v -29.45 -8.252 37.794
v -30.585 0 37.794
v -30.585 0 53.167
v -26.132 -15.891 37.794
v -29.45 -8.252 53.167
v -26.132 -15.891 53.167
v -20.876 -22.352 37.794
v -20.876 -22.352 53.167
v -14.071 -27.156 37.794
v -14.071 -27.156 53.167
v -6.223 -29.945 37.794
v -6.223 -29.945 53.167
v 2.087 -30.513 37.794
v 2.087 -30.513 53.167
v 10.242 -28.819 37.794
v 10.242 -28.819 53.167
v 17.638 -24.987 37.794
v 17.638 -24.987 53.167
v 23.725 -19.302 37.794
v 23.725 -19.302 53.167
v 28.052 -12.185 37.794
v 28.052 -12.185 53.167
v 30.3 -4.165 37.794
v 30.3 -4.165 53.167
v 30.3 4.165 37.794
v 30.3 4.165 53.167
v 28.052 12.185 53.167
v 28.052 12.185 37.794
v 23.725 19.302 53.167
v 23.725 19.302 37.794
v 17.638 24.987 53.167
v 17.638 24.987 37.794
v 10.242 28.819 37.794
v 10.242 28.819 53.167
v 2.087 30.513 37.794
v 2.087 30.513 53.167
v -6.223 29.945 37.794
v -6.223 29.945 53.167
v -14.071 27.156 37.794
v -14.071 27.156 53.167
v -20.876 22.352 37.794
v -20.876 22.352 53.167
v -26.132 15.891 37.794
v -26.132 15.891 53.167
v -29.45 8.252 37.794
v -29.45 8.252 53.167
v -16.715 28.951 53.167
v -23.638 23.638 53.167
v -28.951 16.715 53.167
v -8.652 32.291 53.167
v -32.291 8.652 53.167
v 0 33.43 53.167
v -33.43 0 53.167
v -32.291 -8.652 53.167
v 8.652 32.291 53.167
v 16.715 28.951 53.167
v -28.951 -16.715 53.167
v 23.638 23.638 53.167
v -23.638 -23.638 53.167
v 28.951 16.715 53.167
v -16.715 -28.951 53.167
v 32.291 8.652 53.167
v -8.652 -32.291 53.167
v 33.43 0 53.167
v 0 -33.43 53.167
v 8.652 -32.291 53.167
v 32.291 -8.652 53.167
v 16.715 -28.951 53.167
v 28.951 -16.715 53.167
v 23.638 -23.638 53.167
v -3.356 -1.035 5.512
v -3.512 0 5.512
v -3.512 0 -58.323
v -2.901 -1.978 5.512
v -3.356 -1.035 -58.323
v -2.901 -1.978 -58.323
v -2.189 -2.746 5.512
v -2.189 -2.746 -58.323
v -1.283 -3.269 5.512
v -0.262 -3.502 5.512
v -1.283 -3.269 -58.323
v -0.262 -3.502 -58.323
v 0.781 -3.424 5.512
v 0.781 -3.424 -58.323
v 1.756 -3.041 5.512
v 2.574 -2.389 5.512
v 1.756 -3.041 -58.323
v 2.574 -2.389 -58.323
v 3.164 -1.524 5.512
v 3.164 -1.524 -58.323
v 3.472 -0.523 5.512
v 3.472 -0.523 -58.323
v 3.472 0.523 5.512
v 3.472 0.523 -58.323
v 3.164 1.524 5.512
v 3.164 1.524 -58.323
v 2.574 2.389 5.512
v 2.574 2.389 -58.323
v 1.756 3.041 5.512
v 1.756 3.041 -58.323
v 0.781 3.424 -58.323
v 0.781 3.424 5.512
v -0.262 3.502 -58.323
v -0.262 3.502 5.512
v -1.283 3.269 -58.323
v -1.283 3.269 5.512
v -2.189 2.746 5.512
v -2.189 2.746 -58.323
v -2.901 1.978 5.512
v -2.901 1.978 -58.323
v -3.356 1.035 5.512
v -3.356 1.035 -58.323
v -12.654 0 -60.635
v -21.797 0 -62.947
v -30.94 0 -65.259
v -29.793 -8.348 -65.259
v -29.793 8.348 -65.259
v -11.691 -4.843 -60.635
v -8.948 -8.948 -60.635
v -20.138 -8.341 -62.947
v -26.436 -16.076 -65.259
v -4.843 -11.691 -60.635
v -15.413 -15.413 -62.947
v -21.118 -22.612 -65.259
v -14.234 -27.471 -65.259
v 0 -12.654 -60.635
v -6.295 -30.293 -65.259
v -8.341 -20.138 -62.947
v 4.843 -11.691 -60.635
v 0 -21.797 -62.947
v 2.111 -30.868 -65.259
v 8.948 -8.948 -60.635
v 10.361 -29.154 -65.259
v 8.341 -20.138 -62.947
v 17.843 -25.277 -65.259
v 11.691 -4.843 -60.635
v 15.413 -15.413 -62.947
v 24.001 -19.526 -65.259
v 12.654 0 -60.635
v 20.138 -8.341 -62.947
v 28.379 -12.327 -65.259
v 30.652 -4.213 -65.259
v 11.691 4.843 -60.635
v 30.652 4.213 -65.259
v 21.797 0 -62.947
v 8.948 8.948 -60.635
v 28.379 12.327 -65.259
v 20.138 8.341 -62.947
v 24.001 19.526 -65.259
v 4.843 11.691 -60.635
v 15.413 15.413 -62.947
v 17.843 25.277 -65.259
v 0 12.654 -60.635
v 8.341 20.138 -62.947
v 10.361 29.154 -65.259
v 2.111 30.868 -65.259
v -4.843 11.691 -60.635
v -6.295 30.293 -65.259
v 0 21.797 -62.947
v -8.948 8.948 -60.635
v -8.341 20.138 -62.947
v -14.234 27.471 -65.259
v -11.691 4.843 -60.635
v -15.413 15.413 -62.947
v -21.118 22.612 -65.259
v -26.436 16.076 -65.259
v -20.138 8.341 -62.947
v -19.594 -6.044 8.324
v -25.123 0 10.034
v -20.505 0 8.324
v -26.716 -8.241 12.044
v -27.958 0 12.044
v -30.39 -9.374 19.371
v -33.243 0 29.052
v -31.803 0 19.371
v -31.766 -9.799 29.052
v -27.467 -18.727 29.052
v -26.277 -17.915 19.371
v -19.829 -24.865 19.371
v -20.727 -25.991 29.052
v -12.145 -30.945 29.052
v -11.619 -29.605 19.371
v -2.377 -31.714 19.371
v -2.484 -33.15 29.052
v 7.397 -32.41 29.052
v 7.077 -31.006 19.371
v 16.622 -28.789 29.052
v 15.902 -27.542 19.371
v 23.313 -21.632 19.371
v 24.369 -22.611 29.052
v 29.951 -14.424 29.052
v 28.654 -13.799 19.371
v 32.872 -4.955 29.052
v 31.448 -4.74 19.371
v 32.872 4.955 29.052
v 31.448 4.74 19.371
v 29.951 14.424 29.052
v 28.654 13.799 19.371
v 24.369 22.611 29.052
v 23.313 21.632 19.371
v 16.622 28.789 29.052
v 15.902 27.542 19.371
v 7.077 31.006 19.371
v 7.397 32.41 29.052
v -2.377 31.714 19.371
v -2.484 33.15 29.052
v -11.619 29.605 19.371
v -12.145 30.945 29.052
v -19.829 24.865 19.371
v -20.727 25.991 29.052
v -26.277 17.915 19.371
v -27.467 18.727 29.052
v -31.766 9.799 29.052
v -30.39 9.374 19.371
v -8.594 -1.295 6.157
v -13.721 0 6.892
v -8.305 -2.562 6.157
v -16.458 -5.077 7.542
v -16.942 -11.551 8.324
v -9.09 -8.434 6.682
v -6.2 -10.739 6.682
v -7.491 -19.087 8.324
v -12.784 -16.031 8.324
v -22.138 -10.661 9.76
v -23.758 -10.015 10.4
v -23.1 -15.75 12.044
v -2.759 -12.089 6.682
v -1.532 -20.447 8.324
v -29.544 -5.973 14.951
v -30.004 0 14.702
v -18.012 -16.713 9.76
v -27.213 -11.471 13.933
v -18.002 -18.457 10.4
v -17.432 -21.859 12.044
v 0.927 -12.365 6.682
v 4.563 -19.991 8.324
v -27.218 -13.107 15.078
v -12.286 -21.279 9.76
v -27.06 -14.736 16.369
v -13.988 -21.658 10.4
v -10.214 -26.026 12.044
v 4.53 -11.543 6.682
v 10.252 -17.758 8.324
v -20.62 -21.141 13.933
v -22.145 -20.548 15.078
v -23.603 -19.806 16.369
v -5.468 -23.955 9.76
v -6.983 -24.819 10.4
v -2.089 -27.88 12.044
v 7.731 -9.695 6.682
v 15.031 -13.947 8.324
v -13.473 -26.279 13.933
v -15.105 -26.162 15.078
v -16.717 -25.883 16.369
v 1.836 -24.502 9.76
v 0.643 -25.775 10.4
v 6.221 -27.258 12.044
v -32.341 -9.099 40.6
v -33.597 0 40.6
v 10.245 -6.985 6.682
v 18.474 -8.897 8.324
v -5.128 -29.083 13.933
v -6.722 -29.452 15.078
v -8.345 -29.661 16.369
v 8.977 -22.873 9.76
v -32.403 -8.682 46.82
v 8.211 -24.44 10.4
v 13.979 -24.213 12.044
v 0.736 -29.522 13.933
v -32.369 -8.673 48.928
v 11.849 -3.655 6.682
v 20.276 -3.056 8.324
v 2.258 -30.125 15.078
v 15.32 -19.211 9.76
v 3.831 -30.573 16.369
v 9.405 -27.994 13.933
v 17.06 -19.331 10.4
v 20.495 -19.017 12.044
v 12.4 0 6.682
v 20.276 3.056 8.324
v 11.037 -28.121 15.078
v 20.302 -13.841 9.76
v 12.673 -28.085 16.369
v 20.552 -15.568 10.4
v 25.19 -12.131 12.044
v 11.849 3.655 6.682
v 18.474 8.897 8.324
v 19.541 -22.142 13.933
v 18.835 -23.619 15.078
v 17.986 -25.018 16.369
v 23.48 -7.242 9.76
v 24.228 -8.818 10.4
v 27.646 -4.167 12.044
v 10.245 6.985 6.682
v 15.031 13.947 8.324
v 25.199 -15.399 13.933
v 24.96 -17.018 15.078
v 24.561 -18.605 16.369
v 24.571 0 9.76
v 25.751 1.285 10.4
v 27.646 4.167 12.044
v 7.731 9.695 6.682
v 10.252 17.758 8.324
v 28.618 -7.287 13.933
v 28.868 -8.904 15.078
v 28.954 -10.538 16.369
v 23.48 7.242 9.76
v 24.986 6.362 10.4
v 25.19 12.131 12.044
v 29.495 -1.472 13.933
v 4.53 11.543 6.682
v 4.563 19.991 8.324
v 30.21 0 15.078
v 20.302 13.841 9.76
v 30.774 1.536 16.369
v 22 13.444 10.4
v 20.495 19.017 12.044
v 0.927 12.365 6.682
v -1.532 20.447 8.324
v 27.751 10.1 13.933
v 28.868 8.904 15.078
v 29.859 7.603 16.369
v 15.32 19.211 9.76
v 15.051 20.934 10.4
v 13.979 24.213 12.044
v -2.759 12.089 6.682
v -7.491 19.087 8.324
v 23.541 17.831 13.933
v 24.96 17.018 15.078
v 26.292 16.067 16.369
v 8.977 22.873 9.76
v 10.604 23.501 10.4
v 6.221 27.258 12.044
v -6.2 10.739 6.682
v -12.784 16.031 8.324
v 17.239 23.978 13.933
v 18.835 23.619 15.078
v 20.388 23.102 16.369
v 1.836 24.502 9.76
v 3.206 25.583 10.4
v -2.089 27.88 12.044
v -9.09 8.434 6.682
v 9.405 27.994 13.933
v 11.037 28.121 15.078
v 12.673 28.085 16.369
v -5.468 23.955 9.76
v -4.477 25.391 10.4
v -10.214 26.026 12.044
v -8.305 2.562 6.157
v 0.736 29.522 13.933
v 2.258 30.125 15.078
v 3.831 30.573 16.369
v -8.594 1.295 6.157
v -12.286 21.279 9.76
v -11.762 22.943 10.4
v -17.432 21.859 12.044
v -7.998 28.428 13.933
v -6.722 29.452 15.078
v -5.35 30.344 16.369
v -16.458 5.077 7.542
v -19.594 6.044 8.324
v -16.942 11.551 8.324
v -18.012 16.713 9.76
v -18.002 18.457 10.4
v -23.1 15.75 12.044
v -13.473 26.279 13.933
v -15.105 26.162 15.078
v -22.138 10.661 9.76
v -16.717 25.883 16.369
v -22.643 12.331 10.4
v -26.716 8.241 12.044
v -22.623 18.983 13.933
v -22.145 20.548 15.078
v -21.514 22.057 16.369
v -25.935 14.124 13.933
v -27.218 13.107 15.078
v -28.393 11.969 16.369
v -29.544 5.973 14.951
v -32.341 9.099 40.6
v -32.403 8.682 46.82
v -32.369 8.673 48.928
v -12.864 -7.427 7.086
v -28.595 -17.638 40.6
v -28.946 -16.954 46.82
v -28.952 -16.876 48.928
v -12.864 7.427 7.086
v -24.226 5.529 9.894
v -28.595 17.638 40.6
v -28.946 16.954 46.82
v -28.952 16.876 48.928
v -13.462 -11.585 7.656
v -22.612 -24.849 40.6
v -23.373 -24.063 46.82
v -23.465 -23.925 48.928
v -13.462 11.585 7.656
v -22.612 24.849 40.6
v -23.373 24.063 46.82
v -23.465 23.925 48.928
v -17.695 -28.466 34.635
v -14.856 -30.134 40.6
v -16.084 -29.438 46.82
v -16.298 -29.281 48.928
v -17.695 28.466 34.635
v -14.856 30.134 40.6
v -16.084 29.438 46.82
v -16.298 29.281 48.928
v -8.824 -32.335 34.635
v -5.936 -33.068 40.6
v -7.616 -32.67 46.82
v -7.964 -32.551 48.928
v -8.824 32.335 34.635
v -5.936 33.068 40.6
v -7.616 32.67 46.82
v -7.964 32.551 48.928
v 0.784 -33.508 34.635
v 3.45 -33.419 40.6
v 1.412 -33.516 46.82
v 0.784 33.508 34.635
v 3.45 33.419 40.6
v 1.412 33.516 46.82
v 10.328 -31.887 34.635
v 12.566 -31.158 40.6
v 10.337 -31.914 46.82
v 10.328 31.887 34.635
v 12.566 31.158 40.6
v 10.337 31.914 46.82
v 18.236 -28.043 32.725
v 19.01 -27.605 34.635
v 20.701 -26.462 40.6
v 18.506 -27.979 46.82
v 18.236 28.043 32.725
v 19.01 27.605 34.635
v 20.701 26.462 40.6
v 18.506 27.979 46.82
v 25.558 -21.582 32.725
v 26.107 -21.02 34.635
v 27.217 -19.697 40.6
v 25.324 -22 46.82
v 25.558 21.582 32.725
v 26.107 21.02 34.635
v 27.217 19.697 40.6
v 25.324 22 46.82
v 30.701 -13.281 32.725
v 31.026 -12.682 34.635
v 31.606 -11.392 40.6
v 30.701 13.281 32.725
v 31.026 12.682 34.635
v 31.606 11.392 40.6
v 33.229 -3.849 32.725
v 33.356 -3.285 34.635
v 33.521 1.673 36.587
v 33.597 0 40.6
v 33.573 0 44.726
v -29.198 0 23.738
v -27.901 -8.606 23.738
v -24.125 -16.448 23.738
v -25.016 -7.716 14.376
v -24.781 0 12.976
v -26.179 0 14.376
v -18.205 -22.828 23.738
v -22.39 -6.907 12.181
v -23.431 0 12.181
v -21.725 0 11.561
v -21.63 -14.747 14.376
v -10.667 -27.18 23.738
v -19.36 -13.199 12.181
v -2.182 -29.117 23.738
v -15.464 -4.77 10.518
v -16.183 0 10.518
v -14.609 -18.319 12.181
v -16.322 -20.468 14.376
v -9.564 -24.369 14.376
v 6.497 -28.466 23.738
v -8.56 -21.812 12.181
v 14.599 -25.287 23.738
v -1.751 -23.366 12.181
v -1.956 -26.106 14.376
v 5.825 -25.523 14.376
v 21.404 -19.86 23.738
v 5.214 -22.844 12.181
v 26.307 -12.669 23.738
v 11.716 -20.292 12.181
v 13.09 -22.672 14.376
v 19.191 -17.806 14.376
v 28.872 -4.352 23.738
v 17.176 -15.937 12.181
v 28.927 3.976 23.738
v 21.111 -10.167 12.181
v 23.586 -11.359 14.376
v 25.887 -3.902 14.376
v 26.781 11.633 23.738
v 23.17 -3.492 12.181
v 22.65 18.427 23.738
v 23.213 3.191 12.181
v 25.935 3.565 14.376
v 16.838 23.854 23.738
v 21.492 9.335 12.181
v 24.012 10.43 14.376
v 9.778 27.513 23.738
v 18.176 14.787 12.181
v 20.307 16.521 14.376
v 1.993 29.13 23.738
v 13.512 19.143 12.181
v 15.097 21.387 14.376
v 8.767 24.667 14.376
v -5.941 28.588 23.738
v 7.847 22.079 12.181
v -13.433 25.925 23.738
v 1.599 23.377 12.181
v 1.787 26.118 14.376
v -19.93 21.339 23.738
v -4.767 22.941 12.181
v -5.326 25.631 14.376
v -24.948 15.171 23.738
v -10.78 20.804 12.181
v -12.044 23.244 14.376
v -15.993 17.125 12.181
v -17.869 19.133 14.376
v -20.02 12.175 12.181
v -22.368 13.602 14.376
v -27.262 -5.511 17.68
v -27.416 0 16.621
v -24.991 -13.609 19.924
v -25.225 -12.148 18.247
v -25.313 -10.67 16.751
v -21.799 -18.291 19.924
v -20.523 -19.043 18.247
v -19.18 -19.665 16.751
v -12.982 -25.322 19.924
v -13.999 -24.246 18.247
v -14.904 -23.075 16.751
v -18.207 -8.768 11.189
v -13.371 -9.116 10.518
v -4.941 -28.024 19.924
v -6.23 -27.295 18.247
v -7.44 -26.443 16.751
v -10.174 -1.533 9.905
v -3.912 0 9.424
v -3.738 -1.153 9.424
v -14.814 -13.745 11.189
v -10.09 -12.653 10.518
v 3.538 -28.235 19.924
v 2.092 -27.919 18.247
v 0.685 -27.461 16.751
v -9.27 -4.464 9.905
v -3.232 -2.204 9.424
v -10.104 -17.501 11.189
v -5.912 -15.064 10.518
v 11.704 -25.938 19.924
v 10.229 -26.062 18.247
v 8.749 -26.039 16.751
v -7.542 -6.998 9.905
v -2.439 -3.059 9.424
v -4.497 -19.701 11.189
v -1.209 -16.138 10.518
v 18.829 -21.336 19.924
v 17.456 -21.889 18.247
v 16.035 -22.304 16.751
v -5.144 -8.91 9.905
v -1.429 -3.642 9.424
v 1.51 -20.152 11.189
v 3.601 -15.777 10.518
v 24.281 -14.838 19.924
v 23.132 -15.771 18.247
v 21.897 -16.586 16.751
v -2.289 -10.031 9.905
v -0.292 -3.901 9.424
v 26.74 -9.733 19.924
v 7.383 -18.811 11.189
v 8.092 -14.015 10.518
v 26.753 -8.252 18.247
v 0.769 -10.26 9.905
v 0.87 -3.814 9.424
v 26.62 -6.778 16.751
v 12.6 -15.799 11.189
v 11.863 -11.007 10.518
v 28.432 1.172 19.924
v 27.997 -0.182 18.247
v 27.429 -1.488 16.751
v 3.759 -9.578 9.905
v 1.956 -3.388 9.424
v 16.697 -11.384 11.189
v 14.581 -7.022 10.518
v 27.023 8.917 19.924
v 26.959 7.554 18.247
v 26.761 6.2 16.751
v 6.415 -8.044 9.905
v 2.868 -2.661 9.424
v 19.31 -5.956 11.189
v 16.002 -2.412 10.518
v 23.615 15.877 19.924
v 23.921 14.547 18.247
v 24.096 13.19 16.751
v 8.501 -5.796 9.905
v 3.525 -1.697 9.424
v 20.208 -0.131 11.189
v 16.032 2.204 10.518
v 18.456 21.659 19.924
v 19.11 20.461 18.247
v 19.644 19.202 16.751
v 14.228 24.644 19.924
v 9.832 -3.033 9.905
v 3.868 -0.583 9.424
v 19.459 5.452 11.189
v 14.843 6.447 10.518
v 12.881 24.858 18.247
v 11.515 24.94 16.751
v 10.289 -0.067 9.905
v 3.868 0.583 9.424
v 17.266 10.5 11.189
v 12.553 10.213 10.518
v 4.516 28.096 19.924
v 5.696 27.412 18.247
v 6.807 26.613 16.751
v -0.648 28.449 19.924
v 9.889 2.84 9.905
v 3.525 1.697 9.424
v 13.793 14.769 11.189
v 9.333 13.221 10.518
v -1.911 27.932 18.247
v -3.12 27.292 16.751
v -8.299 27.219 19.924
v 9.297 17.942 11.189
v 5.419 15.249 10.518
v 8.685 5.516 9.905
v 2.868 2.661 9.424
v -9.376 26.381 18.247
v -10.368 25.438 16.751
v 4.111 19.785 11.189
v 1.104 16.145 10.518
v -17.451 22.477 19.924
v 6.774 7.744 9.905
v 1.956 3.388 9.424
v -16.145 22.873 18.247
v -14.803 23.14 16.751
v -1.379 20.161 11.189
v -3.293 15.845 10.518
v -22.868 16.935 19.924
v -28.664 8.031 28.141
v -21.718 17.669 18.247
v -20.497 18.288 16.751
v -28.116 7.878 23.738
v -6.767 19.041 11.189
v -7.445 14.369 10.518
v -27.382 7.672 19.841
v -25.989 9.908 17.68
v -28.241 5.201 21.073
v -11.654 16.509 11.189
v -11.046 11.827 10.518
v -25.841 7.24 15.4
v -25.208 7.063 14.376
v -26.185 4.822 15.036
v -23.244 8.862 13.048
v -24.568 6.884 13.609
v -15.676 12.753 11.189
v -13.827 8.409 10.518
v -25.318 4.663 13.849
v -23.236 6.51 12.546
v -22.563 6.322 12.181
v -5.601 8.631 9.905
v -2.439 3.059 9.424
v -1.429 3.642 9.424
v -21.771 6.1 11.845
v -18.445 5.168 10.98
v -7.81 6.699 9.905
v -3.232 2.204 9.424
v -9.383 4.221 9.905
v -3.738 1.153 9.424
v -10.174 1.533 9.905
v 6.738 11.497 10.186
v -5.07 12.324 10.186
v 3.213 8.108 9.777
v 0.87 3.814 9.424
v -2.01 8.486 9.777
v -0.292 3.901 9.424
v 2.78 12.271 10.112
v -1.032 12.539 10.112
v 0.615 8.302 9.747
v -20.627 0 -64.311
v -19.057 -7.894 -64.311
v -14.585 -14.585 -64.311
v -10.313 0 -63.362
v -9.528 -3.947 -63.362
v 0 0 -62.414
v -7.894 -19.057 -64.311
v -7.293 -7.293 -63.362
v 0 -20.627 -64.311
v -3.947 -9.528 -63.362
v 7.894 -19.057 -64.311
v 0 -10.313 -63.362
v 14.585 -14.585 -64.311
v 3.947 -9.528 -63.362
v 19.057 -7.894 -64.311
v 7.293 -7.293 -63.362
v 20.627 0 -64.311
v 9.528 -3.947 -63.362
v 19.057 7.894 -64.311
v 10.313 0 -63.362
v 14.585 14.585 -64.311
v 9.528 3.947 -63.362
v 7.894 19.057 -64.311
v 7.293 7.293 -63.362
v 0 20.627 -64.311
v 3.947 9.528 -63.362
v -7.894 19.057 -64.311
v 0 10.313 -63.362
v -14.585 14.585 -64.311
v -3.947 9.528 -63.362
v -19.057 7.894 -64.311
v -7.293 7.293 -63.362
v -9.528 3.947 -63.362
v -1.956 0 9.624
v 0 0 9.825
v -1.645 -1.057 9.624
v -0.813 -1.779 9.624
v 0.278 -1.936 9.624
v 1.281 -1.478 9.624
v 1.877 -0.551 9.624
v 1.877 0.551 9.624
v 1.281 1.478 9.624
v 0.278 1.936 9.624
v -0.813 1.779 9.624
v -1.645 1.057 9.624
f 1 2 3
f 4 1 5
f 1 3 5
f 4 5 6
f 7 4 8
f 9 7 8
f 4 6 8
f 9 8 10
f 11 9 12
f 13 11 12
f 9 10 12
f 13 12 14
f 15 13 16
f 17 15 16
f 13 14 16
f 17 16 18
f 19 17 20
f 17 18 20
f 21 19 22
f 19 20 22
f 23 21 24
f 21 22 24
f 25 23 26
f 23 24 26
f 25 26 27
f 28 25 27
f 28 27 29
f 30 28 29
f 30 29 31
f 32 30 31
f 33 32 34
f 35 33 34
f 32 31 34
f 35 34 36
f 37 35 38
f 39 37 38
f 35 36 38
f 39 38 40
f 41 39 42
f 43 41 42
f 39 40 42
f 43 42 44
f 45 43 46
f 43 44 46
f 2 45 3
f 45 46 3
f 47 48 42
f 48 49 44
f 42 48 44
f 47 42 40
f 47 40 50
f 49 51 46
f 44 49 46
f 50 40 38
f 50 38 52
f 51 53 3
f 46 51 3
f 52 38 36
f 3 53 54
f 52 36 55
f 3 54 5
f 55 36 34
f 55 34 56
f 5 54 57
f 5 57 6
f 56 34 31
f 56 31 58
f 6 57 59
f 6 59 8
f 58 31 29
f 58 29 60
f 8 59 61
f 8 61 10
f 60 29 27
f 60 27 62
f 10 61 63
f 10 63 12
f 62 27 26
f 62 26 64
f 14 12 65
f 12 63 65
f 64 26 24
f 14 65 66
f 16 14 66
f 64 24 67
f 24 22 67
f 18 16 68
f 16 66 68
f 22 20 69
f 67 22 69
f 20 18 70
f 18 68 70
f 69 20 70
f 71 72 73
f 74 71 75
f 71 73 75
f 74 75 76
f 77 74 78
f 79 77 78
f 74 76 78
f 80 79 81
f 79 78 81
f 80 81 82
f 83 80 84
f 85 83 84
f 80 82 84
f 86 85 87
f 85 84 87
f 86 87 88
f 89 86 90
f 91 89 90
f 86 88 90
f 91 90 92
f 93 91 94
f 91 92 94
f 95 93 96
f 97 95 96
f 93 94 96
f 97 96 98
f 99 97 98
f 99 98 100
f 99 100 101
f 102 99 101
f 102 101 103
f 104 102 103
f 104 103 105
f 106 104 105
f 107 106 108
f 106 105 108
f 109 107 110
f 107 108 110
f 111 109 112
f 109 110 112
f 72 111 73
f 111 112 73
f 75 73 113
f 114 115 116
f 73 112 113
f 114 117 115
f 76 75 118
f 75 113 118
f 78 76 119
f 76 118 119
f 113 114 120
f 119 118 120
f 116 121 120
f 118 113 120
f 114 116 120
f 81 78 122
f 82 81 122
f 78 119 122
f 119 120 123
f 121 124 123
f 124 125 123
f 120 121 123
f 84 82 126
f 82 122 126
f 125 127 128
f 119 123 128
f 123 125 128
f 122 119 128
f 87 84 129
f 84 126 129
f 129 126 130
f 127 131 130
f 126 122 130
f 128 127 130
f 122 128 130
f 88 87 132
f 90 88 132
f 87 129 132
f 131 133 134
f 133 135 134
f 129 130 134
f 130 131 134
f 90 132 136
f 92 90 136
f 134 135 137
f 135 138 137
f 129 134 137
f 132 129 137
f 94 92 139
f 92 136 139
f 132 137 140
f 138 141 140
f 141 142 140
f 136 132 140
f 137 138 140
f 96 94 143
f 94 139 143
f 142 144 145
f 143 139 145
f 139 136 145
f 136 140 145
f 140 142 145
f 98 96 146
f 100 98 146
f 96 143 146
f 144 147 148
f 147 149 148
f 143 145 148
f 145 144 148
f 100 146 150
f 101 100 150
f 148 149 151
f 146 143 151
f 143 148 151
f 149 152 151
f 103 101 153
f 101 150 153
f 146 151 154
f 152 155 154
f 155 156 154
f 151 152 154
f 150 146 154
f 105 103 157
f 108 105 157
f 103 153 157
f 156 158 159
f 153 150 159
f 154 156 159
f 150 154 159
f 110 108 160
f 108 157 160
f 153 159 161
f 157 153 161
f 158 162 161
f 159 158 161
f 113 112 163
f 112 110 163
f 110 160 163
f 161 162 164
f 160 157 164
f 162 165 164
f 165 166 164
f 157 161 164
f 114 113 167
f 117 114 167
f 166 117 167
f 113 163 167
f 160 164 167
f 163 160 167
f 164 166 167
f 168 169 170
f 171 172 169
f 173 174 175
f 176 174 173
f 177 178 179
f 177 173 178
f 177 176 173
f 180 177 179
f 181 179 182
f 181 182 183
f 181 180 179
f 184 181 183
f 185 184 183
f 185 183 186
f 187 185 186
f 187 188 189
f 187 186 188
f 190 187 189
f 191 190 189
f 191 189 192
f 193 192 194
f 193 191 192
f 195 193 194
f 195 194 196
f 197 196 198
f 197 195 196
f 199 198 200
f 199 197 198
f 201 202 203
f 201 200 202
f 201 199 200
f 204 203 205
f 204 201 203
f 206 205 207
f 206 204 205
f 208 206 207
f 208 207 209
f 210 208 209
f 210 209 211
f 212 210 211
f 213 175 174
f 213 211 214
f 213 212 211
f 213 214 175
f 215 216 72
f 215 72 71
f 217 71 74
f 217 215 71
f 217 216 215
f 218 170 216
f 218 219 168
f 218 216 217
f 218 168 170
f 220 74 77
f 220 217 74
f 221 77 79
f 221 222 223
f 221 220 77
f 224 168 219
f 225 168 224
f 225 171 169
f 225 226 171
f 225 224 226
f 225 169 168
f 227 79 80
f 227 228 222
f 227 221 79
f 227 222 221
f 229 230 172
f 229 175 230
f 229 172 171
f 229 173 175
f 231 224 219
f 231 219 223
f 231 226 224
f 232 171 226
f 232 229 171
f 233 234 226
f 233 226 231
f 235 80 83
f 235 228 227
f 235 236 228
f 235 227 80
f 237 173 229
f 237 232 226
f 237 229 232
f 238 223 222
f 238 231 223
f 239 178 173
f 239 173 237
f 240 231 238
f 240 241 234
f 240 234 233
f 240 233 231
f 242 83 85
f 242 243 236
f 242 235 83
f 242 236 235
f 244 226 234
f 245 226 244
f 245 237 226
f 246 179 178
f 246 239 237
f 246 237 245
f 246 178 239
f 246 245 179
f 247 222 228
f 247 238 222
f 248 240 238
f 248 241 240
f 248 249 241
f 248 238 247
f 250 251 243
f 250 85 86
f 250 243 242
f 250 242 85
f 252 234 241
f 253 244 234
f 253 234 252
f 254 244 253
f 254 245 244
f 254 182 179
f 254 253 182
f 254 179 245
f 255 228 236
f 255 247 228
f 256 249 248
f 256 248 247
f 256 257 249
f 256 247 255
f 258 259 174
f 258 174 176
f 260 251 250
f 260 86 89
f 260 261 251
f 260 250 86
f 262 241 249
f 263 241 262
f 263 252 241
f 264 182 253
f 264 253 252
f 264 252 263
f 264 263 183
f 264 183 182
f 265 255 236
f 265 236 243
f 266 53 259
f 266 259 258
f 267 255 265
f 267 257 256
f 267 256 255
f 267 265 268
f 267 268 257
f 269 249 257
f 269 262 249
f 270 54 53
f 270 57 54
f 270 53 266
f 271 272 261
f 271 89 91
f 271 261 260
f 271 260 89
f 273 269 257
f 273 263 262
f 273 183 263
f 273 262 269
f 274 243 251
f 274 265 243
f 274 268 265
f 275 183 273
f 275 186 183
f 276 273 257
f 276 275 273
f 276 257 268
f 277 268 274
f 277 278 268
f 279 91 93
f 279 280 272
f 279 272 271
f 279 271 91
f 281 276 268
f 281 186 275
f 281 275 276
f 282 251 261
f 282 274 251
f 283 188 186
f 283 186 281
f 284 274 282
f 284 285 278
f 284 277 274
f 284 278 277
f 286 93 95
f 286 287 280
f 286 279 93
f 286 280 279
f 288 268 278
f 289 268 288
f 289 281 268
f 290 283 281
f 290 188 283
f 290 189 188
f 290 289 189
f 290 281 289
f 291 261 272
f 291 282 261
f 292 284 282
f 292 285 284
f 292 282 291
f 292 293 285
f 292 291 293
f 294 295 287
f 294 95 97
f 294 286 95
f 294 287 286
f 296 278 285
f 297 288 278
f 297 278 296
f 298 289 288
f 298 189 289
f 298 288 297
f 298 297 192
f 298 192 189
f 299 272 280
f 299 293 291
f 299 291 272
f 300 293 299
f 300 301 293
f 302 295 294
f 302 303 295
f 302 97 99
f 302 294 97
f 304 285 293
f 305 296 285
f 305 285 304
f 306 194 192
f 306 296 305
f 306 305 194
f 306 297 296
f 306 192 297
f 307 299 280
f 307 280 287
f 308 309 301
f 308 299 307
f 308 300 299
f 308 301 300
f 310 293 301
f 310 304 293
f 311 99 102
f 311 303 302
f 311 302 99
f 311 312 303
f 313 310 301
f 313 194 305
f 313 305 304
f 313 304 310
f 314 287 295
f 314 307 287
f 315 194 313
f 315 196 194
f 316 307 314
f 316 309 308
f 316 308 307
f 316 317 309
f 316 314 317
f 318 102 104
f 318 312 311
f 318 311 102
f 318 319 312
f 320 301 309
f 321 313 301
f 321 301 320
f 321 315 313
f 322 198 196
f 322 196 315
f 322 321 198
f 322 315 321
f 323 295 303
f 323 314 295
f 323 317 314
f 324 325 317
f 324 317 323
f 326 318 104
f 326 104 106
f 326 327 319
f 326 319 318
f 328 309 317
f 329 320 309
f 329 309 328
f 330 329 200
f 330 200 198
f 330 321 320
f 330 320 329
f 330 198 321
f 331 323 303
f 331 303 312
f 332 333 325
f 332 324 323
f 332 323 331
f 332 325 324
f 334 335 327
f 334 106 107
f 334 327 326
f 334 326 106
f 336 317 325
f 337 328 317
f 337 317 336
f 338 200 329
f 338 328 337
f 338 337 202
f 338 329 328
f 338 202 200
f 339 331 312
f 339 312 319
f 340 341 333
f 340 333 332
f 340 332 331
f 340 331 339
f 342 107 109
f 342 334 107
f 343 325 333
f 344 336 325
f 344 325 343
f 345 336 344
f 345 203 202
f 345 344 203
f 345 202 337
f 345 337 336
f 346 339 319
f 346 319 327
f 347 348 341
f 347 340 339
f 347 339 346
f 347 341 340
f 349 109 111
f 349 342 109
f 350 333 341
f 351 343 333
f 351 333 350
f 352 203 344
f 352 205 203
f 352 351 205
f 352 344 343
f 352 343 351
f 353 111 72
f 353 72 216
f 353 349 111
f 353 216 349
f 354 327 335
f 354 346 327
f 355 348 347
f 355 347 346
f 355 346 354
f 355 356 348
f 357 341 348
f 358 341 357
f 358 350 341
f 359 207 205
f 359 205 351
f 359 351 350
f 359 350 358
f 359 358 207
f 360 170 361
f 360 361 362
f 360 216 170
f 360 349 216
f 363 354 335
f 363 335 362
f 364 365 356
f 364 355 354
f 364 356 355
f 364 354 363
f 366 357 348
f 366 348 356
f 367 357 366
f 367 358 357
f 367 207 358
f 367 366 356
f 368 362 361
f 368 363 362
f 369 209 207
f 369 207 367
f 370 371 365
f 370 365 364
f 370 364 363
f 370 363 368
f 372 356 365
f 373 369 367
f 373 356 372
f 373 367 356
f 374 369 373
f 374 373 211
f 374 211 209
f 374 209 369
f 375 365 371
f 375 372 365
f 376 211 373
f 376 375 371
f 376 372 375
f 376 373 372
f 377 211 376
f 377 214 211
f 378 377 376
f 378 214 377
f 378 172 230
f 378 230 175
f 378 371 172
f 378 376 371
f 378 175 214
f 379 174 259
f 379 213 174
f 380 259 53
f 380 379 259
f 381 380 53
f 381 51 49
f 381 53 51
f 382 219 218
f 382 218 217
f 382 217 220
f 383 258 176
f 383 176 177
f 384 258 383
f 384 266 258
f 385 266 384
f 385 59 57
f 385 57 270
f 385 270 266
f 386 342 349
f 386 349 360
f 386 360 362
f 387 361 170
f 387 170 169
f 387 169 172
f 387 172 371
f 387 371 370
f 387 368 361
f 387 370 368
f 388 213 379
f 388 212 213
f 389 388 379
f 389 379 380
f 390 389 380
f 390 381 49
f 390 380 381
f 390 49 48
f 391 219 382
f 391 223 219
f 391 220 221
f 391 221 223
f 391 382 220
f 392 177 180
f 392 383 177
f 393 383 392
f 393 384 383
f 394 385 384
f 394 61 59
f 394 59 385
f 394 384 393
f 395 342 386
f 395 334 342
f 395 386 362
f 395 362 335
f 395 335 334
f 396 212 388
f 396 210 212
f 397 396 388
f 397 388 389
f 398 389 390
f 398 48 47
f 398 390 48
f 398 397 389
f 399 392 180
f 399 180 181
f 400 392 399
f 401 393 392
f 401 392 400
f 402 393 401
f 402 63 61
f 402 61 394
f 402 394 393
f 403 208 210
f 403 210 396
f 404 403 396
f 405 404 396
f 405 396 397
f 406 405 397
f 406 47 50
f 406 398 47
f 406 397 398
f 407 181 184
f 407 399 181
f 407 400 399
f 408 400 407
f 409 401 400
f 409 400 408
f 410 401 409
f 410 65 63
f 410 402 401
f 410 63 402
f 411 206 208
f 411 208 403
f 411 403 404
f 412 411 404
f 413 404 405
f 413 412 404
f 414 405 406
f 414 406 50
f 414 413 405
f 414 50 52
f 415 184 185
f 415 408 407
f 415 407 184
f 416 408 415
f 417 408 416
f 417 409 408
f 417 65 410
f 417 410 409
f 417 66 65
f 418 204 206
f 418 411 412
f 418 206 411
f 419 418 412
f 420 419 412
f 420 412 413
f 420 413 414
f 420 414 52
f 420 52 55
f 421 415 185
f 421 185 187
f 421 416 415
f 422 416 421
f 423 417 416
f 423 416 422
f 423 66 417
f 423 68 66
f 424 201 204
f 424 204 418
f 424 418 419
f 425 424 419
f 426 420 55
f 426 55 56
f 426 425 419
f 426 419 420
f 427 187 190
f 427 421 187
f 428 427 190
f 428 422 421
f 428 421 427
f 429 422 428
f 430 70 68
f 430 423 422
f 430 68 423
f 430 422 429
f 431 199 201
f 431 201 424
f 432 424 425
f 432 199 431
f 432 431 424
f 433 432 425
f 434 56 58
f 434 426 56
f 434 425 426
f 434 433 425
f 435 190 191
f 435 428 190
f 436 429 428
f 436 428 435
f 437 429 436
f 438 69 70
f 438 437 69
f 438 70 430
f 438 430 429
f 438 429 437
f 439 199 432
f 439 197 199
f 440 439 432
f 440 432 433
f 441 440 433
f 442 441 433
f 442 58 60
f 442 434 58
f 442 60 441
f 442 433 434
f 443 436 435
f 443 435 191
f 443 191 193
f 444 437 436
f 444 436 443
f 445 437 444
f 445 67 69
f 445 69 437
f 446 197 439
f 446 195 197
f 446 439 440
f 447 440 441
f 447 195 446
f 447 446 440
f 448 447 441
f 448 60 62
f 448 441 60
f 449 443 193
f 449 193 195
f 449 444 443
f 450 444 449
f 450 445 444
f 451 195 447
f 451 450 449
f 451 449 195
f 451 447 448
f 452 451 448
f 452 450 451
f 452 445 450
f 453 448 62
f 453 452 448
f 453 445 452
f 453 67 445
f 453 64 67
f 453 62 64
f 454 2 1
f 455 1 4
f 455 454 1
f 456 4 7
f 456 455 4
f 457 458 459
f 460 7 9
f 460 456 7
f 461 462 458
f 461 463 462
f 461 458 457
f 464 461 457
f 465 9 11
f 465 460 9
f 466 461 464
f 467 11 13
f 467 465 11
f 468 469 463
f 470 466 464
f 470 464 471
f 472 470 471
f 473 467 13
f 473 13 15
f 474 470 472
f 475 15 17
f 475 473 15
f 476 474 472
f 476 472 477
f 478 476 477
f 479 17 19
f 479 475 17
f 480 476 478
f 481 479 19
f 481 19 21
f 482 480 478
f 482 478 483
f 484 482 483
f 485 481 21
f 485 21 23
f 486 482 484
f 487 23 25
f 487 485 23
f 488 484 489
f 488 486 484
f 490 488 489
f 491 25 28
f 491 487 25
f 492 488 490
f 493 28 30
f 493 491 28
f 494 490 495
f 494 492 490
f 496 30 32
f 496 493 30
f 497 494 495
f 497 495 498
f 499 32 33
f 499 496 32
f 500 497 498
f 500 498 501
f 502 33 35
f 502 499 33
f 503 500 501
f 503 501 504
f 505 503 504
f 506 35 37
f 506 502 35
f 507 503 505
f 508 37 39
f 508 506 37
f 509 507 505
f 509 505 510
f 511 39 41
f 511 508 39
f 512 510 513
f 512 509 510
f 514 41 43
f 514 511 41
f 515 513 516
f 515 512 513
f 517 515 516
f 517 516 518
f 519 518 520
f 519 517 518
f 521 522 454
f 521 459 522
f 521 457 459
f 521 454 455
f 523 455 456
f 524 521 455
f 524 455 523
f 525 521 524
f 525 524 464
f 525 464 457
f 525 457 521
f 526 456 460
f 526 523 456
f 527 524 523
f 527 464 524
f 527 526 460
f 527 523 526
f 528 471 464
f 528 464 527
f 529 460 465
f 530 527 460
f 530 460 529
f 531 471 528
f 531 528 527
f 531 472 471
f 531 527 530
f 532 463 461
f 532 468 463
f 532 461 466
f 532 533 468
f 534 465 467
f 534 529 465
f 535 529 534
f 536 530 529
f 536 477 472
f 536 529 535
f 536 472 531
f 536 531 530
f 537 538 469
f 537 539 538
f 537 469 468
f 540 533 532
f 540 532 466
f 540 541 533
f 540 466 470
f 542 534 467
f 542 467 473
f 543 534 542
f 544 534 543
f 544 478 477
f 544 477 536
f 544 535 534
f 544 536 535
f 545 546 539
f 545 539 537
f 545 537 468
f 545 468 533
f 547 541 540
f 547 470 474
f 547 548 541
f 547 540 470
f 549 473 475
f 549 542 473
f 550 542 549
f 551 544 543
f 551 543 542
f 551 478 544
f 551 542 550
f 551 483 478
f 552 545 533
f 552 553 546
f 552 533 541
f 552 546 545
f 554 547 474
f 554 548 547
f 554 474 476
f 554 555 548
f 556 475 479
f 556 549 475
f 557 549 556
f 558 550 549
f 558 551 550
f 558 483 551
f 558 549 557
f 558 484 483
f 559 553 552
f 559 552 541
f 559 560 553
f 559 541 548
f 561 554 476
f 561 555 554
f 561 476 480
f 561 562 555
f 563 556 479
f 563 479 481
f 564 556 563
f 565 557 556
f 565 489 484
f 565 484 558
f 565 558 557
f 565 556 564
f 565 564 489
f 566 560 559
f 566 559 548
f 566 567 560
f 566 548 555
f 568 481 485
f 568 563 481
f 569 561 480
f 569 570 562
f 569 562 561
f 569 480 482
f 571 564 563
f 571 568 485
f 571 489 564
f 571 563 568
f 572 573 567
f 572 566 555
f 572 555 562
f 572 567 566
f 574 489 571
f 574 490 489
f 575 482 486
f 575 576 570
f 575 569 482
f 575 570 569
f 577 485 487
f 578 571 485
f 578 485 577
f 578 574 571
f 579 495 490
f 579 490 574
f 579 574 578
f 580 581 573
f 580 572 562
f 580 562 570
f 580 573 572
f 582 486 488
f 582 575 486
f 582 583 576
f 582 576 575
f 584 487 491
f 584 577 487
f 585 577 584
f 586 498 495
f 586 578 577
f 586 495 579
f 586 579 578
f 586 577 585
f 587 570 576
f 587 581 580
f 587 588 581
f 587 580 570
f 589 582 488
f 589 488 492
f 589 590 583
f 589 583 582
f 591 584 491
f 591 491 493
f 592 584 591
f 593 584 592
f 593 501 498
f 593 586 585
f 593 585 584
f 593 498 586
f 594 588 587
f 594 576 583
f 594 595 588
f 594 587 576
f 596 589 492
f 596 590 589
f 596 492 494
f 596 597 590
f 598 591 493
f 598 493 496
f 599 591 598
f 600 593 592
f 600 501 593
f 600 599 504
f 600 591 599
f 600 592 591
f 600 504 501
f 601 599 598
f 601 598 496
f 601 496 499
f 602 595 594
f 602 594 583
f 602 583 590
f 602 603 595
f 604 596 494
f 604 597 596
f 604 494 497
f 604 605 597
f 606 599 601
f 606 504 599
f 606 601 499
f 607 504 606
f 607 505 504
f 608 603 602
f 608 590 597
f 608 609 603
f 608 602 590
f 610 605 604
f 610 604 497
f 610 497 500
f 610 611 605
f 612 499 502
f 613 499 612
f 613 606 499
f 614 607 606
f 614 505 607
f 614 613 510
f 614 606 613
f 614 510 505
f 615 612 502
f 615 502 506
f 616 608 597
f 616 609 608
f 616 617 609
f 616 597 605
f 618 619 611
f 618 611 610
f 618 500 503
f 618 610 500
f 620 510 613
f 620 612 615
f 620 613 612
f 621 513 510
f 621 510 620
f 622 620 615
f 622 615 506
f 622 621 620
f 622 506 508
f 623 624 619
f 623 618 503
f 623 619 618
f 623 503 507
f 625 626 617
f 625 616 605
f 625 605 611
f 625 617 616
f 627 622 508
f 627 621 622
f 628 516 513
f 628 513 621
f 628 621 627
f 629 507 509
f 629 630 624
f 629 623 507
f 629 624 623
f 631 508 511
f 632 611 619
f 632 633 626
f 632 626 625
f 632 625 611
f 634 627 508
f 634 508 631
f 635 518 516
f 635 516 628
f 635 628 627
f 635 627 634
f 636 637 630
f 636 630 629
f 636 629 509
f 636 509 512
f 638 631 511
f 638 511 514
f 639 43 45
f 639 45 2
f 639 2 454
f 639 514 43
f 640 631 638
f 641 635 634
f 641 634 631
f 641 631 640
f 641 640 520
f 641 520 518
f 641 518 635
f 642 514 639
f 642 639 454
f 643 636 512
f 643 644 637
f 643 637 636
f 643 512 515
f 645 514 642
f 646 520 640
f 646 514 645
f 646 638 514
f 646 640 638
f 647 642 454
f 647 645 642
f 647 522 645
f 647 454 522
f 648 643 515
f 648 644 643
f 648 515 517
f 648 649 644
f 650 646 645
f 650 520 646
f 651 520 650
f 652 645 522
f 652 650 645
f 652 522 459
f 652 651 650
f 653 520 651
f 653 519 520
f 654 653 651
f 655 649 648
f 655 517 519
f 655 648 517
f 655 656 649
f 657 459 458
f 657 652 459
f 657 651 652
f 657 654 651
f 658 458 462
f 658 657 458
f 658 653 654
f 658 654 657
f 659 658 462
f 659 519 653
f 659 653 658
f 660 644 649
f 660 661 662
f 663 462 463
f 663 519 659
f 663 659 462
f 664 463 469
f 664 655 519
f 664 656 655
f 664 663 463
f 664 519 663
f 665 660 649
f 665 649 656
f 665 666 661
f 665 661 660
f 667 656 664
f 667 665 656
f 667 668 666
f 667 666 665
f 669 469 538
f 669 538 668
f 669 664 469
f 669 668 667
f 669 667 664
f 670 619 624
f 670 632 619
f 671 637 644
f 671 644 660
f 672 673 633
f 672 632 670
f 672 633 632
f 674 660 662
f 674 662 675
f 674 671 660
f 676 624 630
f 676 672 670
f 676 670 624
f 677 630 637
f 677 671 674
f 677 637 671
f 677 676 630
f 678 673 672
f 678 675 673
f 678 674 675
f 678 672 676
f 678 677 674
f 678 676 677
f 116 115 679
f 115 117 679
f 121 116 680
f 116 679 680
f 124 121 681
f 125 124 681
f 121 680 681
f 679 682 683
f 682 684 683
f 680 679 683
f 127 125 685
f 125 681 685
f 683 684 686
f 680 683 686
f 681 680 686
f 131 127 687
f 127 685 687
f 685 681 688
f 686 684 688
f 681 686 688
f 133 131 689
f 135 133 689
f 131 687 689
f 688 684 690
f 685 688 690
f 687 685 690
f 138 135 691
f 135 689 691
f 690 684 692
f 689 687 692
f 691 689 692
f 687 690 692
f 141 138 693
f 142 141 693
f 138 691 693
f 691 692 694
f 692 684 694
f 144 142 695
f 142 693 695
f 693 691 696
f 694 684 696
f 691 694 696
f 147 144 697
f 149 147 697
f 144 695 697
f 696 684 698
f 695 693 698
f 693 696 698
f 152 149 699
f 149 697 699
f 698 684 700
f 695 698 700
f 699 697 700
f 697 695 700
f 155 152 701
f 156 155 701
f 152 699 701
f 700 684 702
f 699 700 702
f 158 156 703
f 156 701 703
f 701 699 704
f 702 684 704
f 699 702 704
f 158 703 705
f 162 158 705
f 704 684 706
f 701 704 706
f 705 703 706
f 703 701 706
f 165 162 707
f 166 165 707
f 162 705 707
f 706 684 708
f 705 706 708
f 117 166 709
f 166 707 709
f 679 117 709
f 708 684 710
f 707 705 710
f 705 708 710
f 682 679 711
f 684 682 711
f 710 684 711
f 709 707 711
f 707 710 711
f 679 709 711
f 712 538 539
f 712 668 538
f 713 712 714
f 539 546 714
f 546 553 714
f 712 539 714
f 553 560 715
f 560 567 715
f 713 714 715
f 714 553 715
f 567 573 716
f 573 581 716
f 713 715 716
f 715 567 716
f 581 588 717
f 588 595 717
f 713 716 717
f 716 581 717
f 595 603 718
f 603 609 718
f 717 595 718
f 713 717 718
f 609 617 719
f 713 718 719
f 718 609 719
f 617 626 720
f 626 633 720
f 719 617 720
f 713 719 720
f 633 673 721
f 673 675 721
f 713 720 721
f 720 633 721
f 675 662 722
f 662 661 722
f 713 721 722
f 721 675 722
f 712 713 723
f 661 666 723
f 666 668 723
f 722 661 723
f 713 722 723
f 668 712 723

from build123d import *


with BuildPart() as f1:
    # F0 (on Front) → F1 (revolve)
    with BuildSketch(Plane.XZ):
        Polygon((-3.5116514776, -58.3229424221), (0, -57.434938848), (0, 9.8246313068), (-3.9119780995, 9.4243045896), (-3.5116514776, 5.5123274215), align=None)
    revolve(axis=Axis((0, 0, -3.7253e-06), (0, 0, 1)))

    # F0 (on Front) → F2 (revolve)
    with BuildSketch(Plane.XZ):
        with BuildLine():
            add(Edge.make_bspline(
                [(-3.5116514776, 5.5123274215), (-9.5735833902, 6.2454415966), (-20.6222907222, 7.5816433353), (-34.2124984937, 13.8966744398), (-33.7360922993, 37.7941769093), (-33.4296226501, 53.1673170626)],
                knots=[0, 0, 0, 0, 0.3024608737, 0.5512766757, 1, 1, 1, 1], degree=3))
            Line((-3.5116514776, 5.5123274215), (-3.9119780995, 9.4243045896))
            add(Edge.make_bspline(
                [(-30.5845458061, 37.7941769093), (-29.9039523902, 28.5965916456), (-28.8347816345, 14.1477460392), (-20.0904764667, 10.5724788206), (-9.9595508368, 9.853495669), (-3.9119780995, 9.4243045896)],
                knots=[0, 0, 0, 0, 0.4138186482, 0.6500838628, 1, 1, 1, 1], degree=3))
            Line((-30.5845458061, 37.7941769093), (-30.5845458061, 53.1673170626))
            Line((-30.5845458061, 53.1673170626), (-33.4296226501, 53.1673170626))
        make_face()
    revolve(axis=Axis((0, 0, -3.7253e-06), (0, 0, 1)))

    # F0 (on Front) → F3 (revolve)
    with BuildSketch(Plane.XZ):
        Polygon((-30.9401806444, -65.2588903904), (0, -62.4138191342), (0, -57.434938848), (-3.5116514776, -58.3229424221), align=None)
    revolve(axis=Axis((0, 0, -3.7253e-06), (0, 0, 1)))


solid = f1.part
